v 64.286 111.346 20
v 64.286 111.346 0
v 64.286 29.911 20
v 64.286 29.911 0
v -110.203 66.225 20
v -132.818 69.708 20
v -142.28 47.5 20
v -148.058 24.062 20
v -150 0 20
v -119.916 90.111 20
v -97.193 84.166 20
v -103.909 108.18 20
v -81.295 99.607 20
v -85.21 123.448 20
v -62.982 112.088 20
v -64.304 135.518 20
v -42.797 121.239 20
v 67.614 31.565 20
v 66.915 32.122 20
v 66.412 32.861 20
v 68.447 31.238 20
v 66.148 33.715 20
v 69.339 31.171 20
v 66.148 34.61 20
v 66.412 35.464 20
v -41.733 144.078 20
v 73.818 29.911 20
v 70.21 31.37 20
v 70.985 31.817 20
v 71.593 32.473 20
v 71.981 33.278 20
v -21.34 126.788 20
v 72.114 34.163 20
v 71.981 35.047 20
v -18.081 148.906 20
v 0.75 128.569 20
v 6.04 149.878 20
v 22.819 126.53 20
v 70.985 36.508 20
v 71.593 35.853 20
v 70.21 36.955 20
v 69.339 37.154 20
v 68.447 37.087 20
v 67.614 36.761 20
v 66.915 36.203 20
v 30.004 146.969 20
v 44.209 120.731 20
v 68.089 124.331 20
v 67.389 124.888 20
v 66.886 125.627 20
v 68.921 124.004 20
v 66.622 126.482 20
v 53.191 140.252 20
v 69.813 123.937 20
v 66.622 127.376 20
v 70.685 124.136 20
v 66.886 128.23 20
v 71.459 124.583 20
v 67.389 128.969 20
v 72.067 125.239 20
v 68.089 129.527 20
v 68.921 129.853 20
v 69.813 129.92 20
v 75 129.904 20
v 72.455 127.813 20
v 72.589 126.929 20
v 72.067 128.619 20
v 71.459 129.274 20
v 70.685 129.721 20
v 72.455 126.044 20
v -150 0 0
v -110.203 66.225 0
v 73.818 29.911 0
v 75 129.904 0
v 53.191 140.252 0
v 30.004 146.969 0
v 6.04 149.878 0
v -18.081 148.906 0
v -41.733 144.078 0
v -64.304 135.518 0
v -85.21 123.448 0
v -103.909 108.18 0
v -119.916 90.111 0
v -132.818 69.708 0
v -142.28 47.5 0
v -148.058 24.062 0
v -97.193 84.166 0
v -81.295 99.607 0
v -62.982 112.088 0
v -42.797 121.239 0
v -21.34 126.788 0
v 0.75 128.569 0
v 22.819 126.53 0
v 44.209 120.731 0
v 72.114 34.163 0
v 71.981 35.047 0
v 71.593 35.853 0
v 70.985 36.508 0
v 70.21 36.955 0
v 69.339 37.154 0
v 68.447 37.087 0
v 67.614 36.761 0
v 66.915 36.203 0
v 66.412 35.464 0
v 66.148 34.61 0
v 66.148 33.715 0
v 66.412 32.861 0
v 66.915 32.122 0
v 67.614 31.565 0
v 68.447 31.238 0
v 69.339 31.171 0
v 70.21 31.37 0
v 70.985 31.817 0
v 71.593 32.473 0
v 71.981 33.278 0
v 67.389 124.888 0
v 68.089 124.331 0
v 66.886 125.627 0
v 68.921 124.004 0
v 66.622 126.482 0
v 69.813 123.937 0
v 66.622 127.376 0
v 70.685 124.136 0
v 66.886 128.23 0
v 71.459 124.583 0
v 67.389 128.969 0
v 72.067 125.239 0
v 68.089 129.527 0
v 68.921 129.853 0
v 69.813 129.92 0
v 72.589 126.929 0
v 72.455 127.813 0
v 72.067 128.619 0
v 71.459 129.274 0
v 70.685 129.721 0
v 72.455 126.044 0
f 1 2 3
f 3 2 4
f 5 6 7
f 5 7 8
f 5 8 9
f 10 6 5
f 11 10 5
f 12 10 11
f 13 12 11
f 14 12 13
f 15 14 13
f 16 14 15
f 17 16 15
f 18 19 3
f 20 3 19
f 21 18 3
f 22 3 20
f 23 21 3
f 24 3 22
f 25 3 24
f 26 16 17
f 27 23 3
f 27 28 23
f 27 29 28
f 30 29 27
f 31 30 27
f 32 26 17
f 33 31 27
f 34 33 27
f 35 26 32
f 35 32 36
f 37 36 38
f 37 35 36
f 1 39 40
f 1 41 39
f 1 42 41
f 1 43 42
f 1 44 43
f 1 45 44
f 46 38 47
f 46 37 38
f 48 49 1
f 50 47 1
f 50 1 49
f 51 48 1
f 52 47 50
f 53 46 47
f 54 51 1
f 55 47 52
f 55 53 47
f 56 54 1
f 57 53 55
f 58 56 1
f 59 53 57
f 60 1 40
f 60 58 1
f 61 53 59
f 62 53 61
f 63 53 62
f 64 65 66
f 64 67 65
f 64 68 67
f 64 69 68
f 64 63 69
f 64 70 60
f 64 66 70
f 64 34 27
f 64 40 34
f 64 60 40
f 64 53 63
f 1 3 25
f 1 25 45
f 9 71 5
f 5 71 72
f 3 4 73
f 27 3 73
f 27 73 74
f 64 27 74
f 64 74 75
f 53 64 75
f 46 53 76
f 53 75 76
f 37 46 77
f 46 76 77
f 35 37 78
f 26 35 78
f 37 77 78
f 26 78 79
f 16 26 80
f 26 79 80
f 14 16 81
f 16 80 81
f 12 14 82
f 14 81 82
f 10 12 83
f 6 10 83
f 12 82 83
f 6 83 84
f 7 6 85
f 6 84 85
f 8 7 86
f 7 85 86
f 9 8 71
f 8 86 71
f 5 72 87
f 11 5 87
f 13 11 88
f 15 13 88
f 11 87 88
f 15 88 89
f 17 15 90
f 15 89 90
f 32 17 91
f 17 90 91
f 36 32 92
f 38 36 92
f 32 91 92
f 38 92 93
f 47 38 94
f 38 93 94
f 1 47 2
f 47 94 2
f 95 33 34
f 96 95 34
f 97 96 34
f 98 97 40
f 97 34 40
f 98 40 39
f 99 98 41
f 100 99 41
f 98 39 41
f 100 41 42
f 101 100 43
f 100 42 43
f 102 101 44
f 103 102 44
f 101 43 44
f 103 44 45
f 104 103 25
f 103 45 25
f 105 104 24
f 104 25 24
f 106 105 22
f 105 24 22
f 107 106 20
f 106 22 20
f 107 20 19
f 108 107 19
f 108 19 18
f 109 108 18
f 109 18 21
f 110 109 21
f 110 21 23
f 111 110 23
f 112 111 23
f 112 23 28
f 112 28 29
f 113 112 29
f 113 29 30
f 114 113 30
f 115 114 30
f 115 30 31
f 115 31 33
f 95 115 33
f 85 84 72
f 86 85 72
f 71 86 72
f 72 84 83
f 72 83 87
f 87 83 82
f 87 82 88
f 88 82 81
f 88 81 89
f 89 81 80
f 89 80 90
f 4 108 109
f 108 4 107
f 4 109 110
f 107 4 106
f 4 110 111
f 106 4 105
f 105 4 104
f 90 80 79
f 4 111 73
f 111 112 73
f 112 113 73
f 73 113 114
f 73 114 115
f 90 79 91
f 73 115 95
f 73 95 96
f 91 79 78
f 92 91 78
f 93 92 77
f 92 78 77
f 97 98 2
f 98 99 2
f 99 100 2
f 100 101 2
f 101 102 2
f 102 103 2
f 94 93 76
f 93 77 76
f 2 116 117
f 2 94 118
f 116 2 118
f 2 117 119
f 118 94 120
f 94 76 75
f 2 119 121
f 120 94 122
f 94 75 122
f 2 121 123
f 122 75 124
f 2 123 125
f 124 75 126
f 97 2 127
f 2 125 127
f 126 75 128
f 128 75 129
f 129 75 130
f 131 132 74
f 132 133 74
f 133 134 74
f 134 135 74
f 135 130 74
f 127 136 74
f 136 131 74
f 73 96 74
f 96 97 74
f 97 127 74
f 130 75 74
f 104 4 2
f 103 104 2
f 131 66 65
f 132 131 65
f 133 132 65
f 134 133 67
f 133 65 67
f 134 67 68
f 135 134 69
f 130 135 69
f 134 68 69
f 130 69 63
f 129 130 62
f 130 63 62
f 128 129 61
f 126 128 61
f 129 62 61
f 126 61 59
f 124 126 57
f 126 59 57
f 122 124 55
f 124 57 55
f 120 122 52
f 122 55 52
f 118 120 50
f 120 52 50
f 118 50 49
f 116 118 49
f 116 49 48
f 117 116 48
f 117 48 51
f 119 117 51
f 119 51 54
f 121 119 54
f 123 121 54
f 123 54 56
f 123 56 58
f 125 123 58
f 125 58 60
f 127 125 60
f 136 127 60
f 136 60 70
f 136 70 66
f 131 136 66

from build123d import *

# Parameters (mm, degrees)
EXTRUDE_2_DEPTH     = 20
SKETCH_10_R         = 3
CUT_EXTRUDE_1_DEPTH = 214.072757527
SKETCH_11_R         = 3
CUT_EXTRUDE_2_DEPTH = 214.072757527


with BuildPart() as part:
    # 草图9 → 凸台-拉伸2 (new body)
    with BuildSketch(Plane.XY):
        with BuildLine():
            Line((-150, 0), (-110.203390468, 66.224778592))
            ThreePointArc((-110.203390468, 66.224778592), (-32.188335395, 124.476582676), (64.285512696, 111.345774179))
            Line((64.285512696, 111.345774179), (64.285512696, 29.910799468))
            Line((64.285512696, 29.910799468), (73.817743163, 29.910799468))
            Line((73.817743163, 29.910799468), (75, 129.903810568))
            ThreePointArc((75, 129.903810568), (-75, 129.903810568), (-150, 0))
        make_face()
    extrude(amount=EXTRUDE_2_DEPTH)

    # 草图10 → 切除-拉伸1 (cut, through all)
    with BuildSketch(Plane.XY.offset(20)):
        with Locations((69.588650595, 126.928706674)):
            Circle(SKETCH_10_R)
    extrude(amount=-CUT_EXTRUDE_1_DEPTH, mode=Mode.SUBTRACT)

    # 草图11 → 切除-拉伸2 (cut, through all)
    with BuildSketch(Plane.XY.offset(20)):
        with Locations((69.114412229, 34.162597533)):
            Circle(SKETCH_11_R)
    extrude(amount=-CUT_EXTRUDE_2_DEPTH, mode=Mode.SUBTRACT)


solid = part.part
